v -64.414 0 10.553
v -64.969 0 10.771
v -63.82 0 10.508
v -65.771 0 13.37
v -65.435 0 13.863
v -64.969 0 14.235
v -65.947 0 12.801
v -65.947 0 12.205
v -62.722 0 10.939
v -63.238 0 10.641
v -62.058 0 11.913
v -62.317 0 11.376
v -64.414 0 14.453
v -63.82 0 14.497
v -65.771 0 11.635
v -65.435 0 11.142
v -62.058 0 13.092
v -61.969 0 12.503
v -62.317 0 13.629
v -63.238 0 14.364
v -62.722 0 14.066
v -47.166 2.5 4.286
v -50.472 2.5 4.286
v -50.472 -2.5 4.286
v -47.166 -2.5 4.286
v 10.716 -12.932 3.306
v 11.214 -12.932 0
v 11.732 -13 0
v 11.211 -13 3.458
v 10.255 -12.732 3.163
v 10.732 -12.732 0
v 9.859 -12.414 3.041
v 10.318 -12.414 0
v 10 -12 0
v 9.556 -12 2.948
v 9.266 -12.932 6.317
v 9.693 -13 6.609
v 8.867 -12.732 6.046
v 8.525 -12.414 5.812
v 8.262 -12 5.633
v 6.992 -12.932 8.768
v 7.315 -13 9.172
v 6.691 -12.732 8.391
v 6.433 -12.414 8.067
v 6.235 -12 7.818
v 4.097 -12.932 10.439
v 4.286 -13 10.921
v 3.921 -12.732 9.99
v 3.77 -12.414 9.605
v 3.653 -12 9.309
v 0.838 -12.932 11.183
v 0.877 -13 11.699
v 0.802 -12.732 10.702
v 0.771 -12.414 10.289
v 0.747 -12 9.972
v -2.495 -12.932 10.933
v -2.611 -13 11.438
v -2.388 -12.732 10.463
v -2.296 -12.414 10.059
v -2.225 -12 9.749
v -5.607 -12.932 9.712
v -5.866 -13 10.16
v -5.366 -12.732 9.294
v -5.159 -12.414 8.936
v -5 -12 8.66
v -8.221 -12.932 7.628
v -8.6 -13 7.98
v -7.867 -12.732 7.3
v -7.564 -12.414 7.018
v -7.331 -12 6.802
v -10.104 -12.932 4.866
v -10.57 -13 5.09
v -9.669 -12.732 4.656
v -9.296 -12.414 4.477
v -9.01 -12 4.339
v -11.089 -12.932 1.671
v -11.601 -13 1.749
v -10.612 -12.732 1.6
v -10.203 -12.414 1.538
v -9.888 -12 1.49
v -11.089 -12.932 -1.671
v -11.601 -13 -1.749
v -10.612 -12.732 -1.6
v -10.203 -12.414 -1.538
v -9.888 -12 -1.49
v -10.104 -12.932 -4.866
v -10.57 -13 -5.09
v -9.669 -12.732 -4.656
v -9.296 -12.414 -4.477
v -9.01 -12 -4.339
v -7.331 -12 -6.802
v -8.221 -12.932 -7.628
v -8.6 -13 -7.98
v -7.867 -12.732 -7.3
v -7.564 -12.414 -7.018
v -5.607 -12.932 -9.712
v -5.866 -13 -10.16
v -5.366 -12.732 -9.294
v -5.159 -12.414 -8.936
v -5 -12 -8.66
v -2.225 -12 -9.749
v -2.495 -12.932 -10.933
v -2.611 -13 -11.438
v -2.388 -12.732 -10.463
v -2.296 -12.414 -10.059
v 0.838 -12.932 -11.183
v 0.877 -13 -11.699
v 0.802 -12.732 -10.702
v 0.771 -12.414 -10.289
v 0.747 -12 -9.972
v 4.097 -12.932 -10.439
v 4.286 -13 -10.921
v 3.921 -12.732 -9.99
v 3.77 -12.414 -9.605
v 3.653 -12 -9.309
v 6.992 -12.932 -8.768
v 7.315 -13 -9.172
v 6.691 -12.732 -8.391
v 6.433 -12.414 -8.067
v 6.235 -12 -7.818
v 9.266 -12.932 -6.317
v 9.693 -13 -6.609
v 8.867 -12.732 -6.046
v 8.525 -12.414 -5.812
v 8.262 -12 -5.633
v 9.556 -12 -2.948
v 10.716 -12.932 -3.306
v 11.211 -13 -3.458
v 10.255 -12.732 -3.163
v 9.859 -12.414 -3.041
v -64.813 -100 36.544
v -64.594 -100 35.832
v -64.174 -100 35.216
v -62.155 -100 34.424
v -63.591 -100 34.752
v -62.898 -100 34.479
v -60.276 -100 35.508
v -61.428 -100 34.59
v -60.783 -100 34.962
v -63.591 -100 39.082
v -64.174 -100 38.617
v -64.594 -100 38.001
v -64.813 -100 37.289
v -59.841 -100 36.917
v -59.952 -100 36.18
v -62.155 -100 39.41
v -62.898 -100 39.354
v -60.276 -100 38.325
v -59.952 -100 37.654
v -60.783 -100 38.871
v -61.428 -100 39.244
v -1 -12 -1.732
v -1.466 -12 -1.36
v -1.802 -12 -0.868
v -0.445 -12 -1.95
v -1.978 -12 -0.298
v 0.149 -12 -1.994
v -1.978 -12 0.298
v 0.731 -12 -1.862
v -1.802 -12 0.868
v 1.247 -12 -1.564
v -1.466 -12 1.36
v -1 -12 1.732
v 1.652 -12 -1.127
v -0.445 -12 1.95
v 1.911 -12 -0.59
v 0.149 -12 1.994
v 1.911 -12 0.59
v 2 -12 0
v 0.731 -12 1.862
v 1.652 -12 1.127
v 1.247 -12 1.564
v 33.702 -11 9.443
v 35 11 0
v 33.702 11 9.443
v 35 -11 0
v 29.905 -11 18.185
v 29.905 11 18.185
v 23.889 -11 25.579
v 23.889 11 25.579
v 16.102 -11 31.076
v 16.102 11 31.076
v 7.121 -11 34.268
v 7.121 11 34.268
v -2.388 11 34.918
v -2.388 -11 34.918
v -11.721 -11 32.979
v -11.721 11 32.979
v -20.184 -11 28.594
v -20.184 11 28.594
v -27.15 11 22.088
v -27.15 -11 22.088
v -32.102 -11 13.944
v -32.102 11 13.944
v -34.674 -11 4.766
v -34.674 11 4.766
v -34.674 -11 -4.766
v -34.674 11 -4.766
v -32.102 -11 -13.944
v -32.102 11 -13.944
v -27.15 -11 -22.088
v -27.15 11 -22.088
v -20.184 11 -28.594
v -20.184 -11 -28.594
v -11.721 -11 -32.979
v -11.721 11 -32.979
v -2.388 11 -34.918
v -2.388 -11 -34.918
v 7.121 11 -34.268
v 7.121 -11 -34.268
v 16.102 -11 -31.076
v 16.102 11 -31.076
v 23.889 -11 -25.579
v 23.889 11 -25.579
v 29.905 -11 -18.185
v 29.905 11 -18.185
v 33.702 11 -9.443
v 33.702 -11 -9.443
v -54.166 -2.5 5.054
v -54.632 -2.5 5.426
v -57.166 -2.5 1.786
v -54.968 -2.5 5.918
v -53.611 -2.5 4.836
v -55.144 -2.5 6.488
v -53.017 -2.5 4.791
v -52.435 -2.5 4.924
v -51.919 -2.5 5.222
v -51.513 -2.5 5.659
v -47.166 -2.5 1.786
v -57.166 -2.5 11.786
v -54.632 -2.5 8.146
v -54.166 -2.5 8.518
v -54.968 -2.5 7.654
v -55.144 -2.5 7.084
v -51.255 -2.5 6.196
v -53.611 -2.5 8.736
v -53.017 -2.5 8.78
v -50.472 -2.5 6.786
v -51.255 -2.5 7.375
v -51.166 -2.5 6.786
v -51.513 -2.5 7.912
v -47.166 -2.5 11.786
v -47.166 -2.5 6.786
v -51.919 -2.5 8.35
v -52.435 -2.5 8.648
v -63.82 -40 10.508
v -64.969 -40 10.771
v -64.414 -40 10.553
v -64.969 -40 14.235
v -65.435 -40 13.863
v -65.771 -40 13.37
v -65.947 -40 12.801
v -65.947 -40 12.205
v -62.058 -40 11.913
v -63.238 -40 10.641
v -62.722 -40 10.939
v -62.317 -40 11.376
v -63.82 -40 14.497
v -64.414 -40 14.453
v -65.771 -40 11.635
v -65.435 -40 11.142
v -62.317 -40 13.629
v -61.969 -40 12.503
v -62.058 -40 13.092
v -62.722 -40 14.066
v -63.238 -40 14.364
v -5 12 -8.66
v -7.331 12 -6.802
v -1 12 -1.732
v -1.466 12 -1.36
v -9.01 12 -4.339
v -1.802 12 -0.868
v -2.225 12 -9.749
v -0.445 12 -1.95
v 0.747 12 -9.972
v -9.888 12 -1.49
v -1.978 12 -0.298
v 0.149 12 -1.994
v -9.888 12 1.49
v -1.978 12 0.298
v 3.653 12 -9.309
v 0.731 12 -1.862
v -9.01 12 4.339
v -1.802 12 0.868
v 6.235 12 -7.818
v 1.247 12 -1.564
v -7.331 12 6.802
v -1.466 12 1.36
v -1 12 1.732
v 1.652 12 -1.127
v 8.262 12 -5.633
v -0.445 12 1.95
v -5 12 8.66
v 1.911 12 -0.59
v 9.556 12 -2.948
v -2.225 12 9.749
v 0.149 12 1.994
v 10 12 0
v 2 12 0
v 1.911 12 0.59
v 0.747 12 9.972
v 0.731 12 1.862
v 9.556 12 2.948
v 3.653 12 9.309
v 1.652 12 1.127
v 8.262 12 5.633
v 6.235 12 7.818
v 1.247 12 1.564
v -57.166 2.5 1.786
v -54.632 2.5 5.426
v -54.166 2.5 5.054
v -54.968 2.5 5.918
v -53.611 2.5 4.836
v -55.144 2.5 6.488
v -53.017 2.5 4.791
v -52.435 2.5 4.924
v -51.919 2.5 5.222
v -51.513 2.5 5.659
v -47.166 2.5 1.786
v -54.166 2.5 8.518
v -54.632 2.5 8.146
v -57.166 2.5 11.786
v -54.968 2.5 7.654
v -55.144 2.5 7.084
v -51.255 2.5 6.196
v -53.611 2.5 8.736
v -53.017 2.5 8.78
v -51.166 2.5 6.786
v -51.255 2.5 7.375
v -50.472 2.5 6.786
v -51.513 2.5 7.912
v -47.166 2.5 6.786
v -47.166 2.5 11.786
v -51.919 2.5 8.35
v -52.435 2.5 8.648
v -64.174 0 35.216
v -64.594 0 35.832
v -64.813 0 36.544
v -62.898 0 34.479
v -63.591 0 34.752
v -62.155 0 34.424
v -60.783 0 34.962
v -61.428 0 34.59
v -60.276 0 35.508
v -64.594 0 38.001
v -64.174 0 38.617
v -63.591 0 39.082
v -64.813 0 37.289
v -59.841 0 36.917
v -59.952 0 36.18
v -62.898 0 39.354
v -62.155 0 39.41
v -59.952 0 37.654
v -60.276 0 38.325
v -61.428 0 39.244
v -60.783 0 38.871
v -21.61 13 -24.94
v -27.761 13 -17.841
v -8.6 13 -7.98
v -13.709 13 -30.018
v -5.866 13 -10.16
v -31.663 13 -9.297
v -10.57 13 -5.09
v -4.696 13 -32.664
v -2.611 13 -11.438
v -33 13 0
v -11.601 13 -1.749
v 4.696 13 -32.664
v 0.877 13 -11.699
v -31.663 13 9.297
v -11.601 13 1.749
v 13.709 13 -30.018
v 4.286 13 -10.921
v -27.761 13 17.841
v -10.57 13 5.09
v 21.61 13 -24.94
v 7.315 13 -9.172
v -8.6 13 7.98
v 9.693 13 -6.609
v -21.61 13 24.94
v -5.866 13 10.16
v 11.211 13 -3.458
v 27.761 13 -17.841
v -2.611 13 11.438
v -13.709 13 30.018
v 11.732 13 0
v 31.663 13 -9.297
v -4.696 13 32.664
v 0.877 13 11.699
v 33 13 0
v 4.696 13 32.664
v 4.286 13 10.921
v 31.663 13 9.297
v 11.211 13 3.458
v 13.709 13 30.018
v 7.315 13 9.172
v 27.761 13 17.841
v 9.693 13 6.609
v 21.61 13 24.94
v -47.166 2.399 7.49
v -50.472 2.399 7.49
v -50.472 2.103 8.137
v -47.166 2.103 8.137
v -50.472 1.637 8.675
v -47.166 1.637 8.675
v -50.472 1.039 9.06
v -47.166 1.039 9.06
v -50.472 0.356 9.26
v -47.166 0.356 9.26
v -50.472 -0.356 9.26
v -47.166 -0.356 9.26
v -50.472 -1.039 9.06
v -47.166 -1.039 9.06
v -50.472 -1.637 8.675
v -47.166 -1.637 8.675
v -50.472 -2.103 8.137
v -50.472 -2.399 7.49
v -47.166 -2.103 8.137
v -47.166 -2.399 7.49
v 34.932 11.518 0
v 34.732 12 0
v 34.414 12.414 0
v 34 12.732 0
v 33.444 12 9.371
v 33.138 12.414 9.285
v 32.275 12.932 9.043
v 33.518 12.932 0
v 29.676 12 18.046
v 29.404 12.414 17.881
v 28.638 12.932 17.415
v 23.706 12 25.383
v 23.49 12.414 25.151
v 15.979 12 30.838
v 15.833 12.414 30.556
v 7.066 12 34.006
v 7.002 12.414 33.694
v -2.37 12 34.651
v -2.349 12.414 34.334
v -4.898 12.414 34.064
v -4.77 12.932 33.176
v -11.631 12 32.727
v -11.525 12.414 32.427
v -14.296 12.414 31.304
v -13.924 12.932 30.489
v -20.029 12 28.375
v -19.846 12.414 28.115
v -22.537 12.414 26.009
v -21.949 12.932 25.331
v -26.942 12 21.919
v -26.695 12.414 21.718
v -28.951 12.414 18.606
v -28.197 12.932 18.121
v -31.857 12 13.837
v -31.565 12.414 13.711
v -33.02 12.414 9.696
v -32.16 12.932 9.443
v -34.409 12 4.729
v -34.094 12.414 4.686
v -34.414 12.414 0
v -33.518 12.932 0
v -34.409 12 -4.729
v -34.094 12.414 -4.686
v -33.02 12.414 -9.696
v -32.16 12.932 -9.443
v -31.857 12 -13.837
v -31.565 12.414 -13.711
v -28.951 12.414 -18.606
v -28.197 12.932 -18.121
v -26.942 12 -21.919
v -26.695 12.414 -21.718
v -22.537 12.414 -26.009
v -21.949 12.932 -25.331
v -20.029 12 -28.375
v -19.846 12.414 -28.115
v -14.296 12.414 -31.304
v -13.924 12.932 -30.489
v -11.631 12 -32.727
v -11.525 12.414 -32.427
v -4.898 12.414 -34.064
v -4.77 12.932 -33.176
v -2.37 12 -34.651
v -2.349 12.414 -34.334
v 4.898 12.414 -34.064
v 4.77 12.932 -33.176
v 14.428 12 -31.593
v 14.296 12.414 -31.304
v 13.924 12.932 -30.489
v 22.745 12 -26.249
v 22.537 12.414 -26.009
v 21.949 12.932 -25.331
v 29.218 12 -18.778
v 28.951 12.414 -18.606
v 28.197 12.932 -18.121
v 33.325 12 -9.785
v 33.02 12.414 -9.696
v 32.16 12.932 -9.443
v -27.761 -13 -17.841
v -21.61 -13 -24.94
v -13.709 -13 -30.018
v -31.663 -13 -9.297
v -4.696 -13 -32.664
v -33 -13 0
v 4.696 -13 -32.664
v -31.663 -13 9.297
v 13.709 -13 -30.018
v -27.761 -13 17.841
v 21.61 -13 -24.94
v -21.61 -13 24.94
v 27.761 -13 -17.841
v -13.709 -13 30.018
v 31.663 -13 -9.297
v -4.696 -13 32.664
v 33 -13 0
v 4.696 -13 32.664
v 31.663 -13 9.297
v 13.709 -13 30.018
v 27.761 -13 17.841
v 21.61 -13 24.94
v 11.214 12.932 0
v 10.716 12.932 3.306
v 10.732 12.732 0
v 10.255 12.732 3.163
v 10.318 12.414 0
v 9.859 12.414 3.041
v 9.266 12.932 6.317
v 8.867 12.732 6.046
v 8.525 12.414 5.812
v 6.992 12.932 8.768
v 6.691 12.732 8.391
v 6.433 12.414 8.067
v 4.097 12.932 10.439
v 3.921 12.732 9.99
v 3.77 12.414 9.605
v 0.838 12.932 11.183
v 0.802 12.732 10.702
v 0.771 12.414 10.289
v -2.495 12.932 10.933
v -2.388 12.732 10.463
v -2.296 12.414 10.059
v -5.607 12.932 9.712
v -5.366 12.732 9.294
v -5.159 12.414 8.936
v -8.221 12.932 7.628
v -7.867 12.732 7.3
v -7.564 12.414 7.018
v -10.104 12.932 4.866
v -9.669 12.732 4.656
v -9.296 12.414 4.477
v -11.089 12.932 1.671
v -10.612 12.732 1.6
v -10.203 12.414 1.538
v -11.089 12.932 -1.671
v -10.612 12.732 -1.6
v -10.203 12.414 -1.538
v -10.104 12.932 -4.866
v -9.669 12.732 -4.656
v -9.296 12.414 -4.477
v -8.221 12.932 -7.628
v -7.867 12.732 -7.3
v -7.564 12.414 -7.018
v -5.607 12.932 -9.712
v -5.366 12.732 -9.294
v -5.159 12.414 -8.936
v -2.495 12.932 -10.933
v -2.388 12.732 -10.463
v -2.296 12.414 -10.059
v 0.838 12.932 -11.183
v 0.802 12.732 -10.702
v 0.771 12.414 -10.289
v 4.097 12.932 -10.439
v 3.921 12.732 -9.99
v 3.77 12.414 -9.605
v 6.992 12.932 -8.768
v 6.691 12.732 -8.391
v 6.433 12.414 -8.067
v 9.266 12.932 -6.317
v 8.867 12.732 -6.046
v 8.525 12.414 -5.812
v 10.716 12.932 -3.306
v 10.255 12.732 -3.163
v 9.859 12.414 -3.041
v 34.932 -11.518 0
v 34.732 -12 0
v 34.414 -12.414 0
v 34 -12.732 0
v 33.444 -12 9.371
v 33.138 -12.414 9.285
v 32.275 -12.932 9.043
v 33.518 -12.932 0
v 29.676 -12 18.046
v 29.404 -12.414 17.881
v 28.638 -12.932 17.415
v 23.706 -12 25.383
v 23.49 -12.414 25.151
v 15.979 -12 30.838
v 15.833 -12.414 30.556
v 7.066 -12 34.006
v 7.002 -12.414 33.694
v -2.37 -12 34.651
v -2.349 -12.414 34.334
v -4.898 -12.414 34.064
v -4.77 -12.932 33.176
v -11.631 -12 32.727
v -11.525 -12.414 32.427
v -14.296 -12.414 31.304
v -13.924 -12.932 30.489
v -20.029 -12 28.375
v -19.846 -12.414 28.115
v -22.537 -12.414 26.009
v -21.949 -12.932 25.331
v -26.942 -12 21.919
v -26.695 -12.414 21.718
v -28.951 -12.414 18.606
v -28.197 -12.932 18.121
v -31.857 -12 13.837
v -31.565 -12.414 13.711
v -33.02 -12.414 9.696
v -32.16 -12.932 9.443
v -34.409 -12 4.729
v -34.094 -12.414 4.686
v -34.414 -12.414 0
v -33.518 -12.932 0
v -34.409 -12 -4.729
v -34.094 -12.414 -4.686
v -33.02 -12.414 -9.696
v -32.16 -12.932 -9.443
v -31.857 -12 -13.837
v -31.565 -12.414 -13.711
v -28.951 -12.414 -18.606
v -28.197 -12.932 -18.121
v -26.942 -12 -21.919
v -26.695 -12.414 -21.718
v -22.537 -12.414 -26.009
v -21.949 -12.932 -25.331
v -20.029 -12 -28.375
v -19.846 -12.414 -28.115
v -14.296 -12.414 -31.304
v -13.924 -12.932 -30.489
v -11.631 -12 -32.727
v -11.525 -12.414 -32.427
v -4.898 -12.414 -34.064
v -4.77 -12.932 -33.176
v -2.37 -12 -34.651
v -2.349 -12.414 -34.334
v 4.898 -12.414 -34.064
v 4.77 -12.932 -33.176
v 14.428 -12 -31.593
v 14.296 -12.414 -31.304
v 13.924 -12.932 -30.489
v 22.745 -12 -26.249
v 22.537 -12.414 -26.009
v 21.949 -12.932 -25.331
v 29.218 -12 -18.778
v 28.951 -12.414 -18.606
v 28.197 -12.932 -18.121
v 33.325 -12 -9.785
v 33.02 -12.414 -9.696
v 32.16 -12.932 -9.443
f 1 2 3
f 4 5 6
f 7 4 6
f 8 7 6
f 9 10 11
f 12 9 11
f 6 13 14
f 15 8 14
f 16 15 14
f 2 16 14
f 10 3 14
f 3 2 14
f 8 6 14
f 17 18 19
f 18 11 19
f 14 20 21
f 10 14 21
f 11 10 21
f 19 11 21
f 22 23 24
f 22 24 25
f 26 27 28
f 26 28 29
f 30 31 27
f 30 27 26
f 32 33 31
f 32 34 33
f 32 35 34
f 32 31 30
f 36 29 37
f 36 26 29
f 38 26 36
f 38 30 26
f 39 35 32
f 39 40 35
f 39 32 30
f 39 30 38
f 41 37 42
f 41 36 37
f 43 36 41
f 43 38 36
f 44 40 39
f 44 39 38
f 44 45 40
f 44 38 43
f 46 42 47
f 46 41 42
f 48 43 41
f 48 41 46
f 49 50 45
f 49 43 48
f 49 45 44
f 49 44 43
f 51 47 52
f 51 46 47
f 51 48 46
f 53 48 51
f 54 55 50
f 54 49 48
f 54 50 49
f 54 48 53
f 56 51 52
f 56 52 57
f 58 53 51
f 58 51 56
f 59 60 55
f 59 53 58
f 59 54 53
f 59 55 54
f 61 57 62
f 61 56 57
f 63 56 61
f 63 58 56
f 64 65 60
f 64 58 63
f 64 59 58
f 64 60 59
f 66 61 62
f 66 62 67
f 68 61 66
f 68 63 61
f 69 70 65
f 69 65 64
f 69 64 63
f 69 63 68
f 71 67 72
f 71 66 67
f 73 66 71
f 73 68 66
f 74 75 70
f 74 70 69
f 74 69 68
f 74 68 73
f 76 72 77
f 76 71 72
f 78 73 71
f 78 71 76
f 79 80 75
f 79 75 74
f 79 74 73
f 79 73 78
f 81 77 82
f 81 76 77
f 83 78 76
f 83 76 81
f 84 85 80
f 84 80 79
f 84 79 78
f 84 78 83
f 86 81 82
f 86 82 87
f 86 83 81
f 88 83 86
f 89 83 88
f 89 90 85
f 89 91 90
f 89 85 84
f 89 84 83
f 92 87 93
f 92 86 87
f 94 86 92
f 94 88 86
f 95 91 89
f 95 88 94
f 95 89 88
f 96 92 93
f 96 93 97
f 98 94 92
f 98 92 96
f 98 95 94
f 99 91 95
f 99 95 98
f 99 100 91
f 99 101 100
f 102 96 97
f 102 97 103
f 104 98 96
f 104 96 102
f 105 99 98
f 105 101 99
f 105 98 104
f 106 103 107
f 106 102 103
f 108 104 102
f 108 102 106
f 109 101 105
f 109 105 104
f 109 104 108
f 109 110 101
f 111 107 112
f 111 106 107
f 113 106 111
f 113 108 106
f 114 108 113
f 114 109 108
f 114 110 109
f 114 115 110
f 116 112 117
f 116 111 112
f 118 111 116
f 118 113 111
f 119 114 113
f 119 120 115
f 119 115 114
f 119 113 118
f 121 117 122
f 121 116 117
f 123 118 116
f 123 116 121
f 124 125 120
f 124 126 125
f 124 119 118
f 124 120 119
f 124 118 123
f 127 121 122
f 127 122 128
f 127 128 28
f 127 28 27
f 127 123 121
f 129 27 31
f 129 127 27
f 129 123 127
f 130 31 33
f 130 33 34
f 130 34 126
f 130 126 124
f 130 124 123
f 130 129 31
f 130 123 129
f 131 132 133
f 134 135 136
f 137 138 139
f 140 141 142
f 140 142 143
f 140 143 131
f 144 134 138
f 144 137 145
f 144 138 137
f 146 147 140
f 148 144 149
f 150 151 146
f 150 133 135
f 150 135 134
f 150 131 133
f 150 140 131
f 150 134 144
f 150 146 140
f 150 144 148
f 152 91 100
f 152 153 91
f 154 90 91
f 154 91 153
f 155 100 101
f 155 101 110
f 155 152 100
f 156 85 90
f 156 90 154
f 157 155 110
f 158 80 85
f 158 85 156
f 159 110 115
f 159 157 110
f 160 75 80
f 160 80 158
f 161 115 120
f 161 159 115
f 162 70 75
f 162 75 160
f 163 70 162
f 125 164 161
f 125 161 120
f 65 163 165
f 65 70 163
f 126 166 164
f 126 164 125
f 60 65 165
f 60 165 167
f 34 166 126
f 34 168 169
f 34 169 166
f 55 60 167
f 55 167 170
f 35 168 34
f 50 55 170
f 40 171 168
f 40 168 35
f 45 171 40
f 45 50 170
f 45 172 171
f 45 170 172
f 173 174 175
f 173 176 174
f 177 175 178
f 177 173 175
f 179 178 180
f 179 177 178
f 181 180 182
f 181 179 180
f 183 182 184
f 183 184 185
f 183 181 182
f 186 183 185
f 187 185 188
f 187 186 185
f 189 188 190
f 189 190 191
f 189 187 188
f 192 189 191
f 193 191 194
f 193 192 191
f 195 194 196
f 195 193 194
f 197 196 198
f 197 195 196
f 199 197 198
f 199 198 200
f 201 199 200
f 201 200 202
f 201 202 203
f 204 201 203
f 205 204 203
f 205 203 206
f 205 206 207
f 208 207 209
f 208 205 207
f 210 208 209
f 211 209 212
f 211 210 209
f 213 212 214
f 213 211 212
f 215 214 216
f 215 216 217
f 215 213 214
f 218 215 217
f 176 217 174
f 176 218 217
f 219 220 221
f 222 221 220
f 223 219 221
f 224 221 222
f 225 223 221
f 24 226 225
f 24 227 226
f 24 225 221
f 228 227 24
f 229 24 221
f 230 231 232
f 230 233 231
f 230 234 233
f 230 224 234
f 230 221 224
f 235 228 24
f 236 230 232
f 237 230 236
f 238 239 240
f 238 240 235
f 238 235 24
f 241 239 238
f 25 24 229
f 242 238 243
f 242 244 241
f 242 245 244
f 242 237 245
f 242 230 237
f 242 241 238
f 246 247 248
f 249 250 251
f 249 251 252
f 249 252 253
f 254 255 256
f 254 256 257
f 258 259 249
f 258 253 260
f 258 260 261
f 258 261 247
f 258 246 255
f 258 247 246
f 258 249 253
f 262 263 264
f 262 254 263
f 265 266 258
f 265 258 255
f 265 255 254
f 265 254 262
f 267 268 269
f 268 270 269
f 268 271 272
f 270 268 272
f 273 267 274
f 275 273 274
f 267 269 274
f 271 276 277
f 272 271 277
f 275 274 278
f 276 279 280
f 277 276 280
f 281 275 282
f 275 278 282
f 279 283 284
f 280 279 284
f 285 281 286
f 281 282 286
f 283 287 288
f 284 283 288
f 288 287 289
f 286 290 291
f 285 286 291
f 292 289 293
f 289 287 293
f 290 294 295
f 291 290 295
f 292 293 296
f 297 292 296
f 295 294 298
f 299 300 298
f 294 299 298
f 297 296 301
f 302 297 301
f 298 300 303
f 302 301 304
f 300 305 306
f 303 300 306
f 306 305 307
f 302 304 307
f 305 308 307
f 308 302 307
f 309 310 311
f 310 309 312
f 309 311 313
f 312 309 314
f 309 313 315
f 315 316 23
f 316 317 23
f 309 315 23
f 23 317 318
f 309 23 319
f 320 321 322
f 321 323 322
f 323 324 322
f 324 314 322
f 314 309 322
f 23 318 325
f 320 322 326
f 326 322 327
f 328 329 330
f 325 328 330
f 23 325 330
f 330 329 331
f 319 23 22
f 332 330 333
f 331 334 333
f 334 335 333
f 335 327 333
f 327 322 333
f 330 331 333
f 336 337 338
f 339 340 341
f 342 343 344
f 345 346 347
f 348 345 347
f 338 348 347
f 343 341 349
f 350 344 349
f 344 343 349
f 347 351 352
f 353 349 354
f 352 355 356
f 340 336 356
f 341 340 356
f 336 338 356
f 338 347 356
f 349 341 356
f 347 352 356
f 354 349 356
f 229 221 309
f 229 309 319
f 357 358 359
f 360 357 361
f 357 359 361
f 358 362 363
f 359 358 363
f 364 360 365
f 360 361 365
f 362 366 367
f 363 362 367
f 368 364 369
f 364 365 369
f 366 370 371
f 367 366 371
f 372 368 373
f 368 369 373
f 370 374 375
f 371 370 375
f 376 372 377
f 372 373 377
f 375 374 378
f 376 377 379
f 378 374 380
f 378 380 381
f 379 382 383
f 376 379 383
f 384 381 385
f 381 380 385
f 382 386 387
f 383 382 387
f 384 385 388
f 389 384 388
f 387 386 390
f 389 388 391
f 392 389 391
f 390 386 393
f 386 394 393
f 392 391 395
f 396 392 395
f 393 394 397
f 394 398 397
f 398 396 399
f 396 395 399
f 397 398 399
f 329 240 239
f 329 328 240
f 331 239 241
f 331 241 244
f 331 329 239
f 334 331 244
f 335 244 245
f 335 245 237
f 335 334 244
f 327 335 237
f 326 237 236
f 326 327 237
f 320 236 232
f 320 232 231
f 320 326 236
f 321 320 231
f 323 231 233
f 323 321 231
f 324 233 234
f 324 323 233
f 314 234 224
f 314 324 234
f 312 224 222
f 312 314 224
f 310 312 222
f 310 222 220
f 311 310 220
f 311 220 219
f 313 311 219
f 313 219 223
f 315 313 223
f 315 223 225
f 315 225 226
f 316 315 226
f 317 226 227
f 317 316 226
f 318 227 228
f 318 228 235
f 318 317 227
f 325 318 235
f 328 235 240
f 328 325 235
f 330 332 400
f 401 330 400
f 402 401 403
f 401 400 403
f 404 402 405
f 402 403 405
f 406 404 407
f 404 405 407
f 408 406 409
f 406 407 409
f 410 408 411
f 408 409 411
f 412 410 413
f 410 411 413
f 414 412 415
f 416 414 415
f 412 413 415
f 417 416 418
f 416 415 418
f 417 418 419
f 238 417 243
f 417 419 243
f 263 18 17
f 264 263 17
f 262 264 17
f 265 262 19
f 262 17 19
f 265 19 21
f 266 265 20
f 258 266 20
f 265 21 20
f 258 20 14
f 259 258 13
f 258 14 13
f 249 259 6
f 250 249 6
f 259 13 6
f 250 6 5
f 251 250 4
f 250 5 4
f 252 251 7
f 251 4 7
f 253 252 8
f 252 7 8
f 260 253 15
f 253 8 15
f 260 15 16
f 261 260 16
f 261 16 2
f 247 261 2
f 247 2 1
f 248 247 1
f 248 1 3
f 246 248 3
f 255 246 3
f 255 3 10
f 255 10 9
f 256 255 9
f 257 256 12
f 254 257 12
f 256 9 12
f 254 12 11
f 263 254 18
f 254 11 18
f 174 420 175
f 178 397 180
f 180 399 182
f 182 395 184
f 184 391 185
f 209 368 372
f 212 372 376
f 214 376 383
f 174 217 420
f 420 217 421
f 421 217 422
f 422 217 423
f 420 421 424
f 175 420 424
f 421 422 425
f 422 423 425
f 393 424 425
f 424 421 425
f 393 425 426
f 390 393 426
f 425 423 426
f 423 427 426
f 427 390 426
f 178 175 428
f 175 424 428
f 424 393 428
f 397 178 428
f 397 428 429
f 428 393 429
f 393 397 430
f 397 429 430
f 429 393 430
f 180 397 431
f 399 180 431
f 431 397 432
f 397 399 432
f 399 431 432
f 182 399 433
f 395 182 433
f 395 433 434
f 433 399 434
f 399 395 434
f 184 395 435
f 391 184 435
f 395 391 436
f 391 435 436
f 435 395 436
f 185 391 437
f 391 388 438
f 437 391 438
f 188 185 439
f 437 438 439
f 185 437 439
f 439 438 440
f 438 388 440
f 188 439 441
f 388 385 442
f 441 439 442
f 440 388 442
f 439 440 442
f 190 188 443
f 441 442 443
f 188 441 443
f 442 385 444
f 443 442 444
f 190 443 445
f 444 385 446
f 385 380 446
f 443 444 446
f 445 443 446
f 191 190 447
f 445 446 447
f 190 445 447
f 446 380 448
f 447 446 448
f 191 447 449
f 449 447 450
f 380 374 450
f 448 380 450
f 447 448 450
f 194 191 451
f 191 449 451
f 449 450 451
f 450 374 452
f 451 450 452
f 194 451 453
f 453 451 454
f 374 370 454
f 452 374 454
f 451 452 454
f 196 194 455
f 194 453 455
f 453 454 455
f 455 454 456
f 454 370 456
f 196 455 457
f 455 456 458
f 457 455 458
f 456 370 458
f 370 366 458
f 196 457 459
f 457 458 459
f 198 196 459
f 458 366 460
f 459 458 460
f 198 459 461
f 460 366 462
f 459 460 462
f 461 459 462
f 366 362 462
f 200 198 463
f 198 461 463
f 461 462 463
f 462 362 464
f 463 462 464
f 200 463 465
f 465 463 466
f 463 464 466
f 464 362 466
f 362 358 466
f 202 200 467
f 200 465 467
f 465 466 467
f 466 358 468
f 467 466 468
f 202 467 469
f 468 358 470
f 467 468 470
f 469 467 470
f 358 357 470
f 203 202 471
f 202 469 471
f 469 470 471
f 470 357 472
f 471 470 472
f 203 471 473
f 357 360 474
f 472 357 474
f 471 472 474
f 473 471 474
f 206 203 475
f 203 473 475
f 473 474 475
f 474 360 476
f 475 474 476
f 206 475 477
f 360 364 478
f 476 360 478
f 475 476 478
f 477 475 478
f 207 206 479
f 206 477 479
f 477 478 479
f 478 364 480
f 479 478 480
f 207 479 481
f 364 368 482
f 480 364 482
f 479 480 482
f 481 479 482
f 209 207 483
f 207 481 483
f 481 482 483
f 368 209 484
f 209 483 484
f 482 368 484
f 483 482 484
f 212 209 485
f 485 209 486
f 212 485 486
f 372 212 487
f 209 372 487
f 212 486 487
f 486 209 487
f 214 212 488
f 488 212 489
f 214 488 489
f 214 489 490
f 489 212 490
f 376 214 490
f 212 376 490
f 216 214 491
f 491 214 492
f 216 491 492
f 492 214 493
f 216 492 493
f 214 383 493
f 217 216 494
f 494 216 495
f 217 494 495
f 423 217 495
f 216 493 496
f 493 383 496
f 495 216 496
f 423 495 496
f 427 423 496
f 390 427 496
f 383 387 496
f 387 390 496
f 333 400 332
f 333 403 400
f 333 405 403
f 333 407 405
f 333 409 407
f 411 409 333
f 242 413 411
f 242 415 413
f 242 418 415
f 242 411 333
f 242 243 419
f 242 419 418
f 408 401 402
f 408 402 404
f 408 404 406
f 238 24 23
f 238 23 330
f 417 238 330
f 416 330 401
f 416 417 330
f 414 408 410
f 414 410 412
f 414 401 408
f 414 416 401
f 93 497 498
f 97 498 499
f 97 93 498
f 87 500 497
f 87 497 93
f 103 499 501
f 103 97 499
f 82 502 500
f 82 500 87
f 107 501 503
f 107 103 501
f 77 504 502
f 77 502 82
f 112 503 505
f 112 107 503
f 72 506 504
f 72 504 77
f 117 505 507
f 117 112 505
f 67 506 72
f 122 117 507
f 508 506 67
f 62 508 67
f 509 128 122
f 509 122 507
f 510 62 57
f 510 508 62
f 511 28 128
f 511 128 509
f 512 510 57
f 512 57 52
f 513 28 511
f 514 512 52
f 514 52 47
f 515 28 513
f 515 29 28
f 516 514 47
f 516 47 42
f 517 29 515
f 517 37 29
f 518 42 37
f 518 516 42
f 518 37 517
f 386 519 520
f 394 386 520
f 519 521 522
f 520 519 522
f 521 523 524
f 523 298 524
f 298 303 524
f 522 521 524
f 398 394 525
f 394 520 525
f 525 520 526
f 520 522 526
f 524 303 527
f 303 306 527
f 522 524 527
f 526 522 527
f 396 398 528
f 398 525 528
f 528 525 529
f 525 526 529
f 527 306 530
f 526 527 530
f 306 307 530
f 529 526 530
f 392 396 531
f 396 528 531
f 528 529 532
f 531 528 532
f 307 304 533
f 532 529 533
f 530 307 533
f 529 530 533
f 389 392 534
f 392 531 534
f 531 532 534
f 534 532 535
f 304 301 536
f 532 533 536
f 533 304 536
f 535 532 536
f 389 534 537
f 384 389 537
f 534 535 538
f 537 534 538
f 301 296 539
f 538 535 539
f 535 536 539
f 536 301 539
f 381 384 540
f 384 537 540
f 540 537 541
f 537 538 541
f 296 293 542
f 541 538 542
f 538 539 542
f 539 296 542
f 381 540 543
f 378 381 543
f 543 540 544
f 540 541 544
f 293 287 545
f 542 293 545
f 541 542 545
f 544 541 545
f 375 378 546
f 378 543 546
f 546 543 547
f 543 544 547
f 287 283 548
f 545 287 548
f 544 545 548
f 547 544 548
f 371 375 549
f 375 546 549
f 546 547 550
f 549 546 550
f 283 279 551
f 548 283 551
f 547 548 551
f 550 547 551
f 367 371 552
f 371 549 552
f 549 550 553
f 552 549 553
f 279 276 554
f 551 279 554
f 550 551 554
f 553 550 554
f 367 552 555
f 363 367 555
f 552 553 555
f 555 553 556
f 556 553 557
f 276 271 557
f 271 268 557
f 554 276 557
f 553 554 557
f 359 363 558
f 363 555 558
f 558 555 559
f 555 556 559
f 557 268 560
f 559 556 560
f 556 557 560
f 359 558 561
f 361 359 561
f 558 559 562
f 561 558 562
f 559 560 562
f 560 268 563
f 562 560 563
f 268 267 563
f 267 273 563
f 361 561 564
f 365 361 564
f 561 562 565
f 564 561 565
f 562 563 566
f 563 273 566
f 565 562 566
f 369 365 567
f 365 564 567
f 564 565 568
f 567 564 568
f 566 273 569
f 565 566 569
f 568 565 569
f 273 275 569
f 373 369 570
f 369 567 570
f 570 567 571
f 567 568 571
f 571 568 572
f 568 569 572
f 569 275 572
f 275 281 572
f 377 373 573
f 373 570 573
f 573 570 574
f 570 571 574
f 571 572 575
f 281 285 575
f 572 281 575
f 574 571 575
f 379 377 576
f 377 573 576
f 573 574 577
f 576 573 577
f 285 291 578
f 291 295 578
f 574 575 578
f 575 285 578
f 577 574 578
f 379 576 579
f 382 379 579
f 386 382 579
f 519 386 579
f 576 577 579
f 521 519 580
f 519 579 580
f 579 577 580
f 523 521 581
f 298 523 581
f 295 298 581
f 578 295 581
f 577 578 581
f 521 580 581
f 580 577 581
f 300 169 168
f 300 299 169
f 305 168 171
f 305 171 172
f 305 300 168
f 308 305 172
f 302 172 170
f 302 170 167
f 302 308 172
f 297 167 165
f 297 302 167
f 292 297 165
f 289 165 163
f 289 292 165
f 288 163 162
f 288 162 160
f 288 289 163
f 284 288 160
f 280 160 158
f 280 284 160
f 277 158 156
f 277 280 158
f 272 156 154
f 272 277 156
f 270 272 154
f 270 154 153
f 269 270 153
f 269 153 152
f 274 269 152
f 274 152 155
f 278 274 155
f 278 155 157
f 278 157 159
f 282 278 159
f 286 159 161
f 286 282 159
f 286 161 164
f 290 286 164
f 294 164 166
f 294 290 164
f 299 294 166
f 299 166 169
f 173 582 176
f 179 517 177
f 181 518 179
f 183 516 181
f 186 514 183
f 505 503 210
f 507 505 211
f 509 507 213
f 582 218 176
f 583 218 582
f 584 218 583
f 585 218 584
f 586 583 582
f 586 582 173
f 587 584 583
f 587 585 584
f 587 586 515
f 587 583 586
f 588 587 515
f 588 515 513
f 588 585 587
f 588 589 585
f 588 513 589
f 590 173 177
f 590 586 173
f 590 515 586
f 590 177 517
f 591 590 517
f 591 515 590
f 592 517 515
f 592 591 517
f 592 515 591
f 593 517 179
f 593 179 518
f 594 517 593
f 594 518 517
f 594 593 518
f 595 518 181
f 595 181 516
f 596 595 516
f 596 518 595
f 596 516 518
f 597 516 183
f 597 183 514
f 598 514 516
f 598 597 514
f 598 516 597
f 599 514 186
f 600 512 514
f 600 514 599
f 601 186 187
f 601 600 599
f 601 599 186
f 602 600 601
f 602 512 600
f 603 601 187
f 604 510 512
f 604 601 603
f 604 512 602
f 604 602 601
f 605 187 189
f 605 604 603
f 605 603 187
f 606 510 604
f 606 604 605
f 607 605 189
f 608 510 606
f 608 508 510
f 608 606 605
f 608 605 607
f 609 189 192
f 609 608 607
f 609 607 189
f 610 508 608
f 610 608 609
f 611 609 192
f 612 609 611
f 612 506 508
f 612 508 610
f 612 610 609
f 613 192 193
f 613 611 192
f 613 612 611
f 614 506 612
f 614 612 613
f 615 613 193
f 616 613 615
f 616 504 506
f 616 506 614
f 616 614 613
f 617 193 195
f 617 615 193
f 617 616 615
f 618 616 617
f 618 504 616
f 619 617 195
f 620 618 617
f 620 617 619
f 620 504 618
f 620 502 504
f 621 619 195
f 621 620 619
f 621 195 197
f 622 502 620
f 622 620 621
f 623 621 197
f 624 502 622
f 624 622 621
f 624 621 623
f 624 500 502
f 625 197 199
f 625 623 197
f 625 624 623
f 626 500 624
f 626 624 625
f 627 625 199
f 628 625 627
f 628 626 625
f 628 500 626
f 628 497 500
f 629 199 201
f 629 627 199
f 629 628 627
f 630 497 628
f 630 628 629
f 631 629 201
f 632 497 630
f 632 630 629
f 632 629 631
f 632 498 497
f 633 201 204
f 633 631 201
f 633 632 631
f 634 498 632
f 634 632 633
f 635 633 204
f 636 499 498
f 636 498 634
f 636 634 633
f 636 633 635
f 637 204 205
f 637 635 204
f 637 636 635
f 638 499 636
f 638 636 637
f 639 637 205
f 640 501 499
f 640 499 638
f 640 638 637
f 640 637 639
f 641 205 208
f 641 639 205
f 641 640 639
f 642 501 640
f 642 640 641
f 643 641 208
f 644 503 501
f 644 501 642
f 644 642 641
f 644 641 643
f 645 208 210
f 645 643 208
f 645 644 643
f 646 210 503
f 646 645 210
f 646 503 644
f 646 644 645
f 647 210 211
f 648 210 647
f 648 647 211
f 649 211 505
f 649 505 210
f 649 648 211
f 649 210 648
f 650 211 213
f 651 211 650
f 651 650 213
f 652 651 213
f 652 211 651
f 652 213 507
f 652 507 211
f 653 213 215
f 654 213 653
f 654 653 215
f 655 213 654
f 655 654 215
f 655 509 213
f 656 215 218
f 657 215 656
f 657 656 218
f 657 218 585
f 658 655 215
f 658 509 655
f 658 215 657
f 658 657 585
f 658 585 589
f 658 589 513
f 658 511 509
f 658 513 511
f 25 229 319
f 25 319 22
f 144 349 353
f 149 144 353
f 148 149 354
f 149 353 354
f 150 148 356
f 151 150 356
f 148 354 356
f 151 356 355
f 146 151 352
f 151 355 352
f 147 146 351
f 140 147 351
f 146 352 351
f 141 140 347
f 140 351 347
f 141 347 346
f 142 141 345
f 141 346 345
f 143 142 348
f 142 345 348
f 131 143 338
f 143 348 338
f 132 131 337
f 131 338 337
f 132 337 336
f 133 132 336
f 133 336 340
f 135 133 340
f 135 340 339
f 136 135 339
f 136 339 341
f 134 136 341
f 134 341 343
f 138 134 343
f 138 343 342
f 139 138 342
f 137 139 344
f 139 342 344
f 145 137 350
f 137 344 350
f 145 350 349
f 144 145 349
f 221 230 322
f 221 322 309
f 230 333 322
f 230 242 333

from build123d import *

# Parameters (mm, degrees)
F0_R     = 10
F0_R_2   = 2
F1_DEPTH = 12
F0_R_3   = 35
F2_DEPTH = 13
F4_R     = 2.5
F5_DEPTH = 100
F4_R_2   = 2
F6_DEPTH = 40
F4_W     = 3.3058956834
F4_H     = 1
F4_H_2   = 2.5
F7_DEPTH = 2.5


# Not quite as in the source:
# - a fillet or chamfer that OpenCascade refuses, or shapes differently, is made with other operations: its cross-section is extruded or revolved along the edge and cut away or added


with BuildPart() as f1:
    # F0 (on Front) → F1 (new body, symmetric)
    with BuildSketch(Plane.XZ):
        Circle(F0_R)
        Circle(F0_R_2, mode=Mode.SUBTRACT)
    extrude(amount=F1_DEPTH, both=True)

    # F0 (on Front) → F2 (join, symmetric)
    with BuildSketch(Plane.XZ):
        Circle(F0_R_3)
        Circle(F0_R, mode=Mode.SUBTRACT)
    extrude(amount=F2_DEPTH, both=True)

    # F3: fillet of radius 2 on 4 edges, made by hand

    # F3_s1 → F3_t2 (revolve, cut)
    with BuildSketch(Plane.XY):
        with BuildLine():
            ThreePointArc((11.7320508076, 13), (10.7320508076, 12.7320508076), (10, 12))
            Line((10, 12), (10, 13))
            Line((10, 13), (11.7320508076, 13))
        make_face()
    revolve(axis=Axis((0, 13, 0), (0, -1, 0)), mode=Mode.SUBTRACT)

    # F3_s3 → F3_t4 (revolve, cut)
    with BuildSketch(Plane.XY):
        with BuildLine():
            ThreePointArc((11.7320508076, -13), (10.7320508076, -12.7320508076), (10, -12))
            Line((10, -12), (10, -13))
            Line((10, -13), (11.7320508076, -13))
        make_face()
    revolve(axis=Axis((0, -13, 0), (0, -1, 0)), mode=Mode.SUBTRACT)

    # F3_s5 → F3_t6 (revolve, cut)
    with BuildSketch(Plane.XY):
        with BuildLine():
            ThreePointArc((35, -11), (34.4142135624, -12.4142135624), (33, -13))
            Line((33, -13), (35, -13))
            Line((35, -13), (35, -11))
        make_face()
    revolve(axis=Axis((0, -13, 0), (0, -1, 0)), mode=Mode.SUBTRACT)

    # F3_s7 → F3_t8 (revolve, cut)
    with BuildSketch(Plane.XY):
        with BuildLine():
            ThreePointArc((35, 11), (34.4142135624, 12.4142135624), (33, 13))
            Line((33, 13), (35, 13))
            Line((35, 13), (35, 11))
        make_face()
    revolve(axis=Axis((0, 13, 0), (0, -1, 0)), mode=Mode.SUBTRACT)


with BuildPart() as f5:
    # F4 (on Front) → F5 (new body)
    with BuildSketch(Plane.XZ):
        with Locations((-62.3413799527, 36.9166958029)):
            Circle(F4_R)
    extrude(amount=F5_DEPTH)


with BuildPart() as f6:
    # F4 (on Front) → F6 (new body)
    with BuildSketch(Plane.XZ):
        with Locations((-63.968997372, 12.5027095192)):
            Circle(F4_R_2)
    extrude(amount=F6_DEPTH)


with BuildPart() as f7:
    # F4 (on Front) → F7 (new body, symmetric)
    with BuildSketch(Plane.XZ):
        Polygon((-47.1659764079, 10.2858506218), (-47.1659764079, 11.7858506218), (-57.1659764079, 11.7858506218), (-57.1659764079, 10.2858506218), (-50.4718720913, 10.2858506218), align=None)
        Polygon((-50.4718720913, 10.2858506218), (-57.1659764079, 10.2858506218), (-57.1659764079, 3.2858506218), (-50.4718720913, 3.2858506218), (-50.4718720913, 4.2858506218), (-50.4718720913, 6.7858506218), (-50.4718720913, 9.2858506218), align=None)
        with Locations((-53.1659764079, 6.7858506218)):
            Circle(F4_R_2, mode=Mode.SUBTRACT)
        Polygon((-50.4718720913, 3.2858506218), (-57.1659764079, 3.2858506218), (-57.1659764079, 1.7858506218), (-47.1659764079, 1.7858506218), (-47.1659764079, 3.2858506218), align=None)
        with Locations((-48.8189242496, 9.7858506218)):
            Rectangle(F4_W, F4_H)
        with Locations((-48.8189242496, 8.0358506218)):
            Rectangle(F4_W, F4_H_2)
        with Locations((-48.8189242496, 3.7858506218)):
            Rectangle(F4_W, F4_H)
    extrude(amount=F7_DEPTH, both=True)

    # F4 (on Front) → F8 (revolve, cut)
    with BuildSketch(Plane.XZ):
        with Locations((-48.8189242496, 5.5358506218)):
            Rectangle(F4_W, F4_H_2)
    revolve(axis=Axis((-48.8189242496, 0, 6.7858506218), (1, 0, 0)), mode=Mode.SUBTRACT)


solid = Compound([f1.part, f5.part, f6.part, f7.part])
